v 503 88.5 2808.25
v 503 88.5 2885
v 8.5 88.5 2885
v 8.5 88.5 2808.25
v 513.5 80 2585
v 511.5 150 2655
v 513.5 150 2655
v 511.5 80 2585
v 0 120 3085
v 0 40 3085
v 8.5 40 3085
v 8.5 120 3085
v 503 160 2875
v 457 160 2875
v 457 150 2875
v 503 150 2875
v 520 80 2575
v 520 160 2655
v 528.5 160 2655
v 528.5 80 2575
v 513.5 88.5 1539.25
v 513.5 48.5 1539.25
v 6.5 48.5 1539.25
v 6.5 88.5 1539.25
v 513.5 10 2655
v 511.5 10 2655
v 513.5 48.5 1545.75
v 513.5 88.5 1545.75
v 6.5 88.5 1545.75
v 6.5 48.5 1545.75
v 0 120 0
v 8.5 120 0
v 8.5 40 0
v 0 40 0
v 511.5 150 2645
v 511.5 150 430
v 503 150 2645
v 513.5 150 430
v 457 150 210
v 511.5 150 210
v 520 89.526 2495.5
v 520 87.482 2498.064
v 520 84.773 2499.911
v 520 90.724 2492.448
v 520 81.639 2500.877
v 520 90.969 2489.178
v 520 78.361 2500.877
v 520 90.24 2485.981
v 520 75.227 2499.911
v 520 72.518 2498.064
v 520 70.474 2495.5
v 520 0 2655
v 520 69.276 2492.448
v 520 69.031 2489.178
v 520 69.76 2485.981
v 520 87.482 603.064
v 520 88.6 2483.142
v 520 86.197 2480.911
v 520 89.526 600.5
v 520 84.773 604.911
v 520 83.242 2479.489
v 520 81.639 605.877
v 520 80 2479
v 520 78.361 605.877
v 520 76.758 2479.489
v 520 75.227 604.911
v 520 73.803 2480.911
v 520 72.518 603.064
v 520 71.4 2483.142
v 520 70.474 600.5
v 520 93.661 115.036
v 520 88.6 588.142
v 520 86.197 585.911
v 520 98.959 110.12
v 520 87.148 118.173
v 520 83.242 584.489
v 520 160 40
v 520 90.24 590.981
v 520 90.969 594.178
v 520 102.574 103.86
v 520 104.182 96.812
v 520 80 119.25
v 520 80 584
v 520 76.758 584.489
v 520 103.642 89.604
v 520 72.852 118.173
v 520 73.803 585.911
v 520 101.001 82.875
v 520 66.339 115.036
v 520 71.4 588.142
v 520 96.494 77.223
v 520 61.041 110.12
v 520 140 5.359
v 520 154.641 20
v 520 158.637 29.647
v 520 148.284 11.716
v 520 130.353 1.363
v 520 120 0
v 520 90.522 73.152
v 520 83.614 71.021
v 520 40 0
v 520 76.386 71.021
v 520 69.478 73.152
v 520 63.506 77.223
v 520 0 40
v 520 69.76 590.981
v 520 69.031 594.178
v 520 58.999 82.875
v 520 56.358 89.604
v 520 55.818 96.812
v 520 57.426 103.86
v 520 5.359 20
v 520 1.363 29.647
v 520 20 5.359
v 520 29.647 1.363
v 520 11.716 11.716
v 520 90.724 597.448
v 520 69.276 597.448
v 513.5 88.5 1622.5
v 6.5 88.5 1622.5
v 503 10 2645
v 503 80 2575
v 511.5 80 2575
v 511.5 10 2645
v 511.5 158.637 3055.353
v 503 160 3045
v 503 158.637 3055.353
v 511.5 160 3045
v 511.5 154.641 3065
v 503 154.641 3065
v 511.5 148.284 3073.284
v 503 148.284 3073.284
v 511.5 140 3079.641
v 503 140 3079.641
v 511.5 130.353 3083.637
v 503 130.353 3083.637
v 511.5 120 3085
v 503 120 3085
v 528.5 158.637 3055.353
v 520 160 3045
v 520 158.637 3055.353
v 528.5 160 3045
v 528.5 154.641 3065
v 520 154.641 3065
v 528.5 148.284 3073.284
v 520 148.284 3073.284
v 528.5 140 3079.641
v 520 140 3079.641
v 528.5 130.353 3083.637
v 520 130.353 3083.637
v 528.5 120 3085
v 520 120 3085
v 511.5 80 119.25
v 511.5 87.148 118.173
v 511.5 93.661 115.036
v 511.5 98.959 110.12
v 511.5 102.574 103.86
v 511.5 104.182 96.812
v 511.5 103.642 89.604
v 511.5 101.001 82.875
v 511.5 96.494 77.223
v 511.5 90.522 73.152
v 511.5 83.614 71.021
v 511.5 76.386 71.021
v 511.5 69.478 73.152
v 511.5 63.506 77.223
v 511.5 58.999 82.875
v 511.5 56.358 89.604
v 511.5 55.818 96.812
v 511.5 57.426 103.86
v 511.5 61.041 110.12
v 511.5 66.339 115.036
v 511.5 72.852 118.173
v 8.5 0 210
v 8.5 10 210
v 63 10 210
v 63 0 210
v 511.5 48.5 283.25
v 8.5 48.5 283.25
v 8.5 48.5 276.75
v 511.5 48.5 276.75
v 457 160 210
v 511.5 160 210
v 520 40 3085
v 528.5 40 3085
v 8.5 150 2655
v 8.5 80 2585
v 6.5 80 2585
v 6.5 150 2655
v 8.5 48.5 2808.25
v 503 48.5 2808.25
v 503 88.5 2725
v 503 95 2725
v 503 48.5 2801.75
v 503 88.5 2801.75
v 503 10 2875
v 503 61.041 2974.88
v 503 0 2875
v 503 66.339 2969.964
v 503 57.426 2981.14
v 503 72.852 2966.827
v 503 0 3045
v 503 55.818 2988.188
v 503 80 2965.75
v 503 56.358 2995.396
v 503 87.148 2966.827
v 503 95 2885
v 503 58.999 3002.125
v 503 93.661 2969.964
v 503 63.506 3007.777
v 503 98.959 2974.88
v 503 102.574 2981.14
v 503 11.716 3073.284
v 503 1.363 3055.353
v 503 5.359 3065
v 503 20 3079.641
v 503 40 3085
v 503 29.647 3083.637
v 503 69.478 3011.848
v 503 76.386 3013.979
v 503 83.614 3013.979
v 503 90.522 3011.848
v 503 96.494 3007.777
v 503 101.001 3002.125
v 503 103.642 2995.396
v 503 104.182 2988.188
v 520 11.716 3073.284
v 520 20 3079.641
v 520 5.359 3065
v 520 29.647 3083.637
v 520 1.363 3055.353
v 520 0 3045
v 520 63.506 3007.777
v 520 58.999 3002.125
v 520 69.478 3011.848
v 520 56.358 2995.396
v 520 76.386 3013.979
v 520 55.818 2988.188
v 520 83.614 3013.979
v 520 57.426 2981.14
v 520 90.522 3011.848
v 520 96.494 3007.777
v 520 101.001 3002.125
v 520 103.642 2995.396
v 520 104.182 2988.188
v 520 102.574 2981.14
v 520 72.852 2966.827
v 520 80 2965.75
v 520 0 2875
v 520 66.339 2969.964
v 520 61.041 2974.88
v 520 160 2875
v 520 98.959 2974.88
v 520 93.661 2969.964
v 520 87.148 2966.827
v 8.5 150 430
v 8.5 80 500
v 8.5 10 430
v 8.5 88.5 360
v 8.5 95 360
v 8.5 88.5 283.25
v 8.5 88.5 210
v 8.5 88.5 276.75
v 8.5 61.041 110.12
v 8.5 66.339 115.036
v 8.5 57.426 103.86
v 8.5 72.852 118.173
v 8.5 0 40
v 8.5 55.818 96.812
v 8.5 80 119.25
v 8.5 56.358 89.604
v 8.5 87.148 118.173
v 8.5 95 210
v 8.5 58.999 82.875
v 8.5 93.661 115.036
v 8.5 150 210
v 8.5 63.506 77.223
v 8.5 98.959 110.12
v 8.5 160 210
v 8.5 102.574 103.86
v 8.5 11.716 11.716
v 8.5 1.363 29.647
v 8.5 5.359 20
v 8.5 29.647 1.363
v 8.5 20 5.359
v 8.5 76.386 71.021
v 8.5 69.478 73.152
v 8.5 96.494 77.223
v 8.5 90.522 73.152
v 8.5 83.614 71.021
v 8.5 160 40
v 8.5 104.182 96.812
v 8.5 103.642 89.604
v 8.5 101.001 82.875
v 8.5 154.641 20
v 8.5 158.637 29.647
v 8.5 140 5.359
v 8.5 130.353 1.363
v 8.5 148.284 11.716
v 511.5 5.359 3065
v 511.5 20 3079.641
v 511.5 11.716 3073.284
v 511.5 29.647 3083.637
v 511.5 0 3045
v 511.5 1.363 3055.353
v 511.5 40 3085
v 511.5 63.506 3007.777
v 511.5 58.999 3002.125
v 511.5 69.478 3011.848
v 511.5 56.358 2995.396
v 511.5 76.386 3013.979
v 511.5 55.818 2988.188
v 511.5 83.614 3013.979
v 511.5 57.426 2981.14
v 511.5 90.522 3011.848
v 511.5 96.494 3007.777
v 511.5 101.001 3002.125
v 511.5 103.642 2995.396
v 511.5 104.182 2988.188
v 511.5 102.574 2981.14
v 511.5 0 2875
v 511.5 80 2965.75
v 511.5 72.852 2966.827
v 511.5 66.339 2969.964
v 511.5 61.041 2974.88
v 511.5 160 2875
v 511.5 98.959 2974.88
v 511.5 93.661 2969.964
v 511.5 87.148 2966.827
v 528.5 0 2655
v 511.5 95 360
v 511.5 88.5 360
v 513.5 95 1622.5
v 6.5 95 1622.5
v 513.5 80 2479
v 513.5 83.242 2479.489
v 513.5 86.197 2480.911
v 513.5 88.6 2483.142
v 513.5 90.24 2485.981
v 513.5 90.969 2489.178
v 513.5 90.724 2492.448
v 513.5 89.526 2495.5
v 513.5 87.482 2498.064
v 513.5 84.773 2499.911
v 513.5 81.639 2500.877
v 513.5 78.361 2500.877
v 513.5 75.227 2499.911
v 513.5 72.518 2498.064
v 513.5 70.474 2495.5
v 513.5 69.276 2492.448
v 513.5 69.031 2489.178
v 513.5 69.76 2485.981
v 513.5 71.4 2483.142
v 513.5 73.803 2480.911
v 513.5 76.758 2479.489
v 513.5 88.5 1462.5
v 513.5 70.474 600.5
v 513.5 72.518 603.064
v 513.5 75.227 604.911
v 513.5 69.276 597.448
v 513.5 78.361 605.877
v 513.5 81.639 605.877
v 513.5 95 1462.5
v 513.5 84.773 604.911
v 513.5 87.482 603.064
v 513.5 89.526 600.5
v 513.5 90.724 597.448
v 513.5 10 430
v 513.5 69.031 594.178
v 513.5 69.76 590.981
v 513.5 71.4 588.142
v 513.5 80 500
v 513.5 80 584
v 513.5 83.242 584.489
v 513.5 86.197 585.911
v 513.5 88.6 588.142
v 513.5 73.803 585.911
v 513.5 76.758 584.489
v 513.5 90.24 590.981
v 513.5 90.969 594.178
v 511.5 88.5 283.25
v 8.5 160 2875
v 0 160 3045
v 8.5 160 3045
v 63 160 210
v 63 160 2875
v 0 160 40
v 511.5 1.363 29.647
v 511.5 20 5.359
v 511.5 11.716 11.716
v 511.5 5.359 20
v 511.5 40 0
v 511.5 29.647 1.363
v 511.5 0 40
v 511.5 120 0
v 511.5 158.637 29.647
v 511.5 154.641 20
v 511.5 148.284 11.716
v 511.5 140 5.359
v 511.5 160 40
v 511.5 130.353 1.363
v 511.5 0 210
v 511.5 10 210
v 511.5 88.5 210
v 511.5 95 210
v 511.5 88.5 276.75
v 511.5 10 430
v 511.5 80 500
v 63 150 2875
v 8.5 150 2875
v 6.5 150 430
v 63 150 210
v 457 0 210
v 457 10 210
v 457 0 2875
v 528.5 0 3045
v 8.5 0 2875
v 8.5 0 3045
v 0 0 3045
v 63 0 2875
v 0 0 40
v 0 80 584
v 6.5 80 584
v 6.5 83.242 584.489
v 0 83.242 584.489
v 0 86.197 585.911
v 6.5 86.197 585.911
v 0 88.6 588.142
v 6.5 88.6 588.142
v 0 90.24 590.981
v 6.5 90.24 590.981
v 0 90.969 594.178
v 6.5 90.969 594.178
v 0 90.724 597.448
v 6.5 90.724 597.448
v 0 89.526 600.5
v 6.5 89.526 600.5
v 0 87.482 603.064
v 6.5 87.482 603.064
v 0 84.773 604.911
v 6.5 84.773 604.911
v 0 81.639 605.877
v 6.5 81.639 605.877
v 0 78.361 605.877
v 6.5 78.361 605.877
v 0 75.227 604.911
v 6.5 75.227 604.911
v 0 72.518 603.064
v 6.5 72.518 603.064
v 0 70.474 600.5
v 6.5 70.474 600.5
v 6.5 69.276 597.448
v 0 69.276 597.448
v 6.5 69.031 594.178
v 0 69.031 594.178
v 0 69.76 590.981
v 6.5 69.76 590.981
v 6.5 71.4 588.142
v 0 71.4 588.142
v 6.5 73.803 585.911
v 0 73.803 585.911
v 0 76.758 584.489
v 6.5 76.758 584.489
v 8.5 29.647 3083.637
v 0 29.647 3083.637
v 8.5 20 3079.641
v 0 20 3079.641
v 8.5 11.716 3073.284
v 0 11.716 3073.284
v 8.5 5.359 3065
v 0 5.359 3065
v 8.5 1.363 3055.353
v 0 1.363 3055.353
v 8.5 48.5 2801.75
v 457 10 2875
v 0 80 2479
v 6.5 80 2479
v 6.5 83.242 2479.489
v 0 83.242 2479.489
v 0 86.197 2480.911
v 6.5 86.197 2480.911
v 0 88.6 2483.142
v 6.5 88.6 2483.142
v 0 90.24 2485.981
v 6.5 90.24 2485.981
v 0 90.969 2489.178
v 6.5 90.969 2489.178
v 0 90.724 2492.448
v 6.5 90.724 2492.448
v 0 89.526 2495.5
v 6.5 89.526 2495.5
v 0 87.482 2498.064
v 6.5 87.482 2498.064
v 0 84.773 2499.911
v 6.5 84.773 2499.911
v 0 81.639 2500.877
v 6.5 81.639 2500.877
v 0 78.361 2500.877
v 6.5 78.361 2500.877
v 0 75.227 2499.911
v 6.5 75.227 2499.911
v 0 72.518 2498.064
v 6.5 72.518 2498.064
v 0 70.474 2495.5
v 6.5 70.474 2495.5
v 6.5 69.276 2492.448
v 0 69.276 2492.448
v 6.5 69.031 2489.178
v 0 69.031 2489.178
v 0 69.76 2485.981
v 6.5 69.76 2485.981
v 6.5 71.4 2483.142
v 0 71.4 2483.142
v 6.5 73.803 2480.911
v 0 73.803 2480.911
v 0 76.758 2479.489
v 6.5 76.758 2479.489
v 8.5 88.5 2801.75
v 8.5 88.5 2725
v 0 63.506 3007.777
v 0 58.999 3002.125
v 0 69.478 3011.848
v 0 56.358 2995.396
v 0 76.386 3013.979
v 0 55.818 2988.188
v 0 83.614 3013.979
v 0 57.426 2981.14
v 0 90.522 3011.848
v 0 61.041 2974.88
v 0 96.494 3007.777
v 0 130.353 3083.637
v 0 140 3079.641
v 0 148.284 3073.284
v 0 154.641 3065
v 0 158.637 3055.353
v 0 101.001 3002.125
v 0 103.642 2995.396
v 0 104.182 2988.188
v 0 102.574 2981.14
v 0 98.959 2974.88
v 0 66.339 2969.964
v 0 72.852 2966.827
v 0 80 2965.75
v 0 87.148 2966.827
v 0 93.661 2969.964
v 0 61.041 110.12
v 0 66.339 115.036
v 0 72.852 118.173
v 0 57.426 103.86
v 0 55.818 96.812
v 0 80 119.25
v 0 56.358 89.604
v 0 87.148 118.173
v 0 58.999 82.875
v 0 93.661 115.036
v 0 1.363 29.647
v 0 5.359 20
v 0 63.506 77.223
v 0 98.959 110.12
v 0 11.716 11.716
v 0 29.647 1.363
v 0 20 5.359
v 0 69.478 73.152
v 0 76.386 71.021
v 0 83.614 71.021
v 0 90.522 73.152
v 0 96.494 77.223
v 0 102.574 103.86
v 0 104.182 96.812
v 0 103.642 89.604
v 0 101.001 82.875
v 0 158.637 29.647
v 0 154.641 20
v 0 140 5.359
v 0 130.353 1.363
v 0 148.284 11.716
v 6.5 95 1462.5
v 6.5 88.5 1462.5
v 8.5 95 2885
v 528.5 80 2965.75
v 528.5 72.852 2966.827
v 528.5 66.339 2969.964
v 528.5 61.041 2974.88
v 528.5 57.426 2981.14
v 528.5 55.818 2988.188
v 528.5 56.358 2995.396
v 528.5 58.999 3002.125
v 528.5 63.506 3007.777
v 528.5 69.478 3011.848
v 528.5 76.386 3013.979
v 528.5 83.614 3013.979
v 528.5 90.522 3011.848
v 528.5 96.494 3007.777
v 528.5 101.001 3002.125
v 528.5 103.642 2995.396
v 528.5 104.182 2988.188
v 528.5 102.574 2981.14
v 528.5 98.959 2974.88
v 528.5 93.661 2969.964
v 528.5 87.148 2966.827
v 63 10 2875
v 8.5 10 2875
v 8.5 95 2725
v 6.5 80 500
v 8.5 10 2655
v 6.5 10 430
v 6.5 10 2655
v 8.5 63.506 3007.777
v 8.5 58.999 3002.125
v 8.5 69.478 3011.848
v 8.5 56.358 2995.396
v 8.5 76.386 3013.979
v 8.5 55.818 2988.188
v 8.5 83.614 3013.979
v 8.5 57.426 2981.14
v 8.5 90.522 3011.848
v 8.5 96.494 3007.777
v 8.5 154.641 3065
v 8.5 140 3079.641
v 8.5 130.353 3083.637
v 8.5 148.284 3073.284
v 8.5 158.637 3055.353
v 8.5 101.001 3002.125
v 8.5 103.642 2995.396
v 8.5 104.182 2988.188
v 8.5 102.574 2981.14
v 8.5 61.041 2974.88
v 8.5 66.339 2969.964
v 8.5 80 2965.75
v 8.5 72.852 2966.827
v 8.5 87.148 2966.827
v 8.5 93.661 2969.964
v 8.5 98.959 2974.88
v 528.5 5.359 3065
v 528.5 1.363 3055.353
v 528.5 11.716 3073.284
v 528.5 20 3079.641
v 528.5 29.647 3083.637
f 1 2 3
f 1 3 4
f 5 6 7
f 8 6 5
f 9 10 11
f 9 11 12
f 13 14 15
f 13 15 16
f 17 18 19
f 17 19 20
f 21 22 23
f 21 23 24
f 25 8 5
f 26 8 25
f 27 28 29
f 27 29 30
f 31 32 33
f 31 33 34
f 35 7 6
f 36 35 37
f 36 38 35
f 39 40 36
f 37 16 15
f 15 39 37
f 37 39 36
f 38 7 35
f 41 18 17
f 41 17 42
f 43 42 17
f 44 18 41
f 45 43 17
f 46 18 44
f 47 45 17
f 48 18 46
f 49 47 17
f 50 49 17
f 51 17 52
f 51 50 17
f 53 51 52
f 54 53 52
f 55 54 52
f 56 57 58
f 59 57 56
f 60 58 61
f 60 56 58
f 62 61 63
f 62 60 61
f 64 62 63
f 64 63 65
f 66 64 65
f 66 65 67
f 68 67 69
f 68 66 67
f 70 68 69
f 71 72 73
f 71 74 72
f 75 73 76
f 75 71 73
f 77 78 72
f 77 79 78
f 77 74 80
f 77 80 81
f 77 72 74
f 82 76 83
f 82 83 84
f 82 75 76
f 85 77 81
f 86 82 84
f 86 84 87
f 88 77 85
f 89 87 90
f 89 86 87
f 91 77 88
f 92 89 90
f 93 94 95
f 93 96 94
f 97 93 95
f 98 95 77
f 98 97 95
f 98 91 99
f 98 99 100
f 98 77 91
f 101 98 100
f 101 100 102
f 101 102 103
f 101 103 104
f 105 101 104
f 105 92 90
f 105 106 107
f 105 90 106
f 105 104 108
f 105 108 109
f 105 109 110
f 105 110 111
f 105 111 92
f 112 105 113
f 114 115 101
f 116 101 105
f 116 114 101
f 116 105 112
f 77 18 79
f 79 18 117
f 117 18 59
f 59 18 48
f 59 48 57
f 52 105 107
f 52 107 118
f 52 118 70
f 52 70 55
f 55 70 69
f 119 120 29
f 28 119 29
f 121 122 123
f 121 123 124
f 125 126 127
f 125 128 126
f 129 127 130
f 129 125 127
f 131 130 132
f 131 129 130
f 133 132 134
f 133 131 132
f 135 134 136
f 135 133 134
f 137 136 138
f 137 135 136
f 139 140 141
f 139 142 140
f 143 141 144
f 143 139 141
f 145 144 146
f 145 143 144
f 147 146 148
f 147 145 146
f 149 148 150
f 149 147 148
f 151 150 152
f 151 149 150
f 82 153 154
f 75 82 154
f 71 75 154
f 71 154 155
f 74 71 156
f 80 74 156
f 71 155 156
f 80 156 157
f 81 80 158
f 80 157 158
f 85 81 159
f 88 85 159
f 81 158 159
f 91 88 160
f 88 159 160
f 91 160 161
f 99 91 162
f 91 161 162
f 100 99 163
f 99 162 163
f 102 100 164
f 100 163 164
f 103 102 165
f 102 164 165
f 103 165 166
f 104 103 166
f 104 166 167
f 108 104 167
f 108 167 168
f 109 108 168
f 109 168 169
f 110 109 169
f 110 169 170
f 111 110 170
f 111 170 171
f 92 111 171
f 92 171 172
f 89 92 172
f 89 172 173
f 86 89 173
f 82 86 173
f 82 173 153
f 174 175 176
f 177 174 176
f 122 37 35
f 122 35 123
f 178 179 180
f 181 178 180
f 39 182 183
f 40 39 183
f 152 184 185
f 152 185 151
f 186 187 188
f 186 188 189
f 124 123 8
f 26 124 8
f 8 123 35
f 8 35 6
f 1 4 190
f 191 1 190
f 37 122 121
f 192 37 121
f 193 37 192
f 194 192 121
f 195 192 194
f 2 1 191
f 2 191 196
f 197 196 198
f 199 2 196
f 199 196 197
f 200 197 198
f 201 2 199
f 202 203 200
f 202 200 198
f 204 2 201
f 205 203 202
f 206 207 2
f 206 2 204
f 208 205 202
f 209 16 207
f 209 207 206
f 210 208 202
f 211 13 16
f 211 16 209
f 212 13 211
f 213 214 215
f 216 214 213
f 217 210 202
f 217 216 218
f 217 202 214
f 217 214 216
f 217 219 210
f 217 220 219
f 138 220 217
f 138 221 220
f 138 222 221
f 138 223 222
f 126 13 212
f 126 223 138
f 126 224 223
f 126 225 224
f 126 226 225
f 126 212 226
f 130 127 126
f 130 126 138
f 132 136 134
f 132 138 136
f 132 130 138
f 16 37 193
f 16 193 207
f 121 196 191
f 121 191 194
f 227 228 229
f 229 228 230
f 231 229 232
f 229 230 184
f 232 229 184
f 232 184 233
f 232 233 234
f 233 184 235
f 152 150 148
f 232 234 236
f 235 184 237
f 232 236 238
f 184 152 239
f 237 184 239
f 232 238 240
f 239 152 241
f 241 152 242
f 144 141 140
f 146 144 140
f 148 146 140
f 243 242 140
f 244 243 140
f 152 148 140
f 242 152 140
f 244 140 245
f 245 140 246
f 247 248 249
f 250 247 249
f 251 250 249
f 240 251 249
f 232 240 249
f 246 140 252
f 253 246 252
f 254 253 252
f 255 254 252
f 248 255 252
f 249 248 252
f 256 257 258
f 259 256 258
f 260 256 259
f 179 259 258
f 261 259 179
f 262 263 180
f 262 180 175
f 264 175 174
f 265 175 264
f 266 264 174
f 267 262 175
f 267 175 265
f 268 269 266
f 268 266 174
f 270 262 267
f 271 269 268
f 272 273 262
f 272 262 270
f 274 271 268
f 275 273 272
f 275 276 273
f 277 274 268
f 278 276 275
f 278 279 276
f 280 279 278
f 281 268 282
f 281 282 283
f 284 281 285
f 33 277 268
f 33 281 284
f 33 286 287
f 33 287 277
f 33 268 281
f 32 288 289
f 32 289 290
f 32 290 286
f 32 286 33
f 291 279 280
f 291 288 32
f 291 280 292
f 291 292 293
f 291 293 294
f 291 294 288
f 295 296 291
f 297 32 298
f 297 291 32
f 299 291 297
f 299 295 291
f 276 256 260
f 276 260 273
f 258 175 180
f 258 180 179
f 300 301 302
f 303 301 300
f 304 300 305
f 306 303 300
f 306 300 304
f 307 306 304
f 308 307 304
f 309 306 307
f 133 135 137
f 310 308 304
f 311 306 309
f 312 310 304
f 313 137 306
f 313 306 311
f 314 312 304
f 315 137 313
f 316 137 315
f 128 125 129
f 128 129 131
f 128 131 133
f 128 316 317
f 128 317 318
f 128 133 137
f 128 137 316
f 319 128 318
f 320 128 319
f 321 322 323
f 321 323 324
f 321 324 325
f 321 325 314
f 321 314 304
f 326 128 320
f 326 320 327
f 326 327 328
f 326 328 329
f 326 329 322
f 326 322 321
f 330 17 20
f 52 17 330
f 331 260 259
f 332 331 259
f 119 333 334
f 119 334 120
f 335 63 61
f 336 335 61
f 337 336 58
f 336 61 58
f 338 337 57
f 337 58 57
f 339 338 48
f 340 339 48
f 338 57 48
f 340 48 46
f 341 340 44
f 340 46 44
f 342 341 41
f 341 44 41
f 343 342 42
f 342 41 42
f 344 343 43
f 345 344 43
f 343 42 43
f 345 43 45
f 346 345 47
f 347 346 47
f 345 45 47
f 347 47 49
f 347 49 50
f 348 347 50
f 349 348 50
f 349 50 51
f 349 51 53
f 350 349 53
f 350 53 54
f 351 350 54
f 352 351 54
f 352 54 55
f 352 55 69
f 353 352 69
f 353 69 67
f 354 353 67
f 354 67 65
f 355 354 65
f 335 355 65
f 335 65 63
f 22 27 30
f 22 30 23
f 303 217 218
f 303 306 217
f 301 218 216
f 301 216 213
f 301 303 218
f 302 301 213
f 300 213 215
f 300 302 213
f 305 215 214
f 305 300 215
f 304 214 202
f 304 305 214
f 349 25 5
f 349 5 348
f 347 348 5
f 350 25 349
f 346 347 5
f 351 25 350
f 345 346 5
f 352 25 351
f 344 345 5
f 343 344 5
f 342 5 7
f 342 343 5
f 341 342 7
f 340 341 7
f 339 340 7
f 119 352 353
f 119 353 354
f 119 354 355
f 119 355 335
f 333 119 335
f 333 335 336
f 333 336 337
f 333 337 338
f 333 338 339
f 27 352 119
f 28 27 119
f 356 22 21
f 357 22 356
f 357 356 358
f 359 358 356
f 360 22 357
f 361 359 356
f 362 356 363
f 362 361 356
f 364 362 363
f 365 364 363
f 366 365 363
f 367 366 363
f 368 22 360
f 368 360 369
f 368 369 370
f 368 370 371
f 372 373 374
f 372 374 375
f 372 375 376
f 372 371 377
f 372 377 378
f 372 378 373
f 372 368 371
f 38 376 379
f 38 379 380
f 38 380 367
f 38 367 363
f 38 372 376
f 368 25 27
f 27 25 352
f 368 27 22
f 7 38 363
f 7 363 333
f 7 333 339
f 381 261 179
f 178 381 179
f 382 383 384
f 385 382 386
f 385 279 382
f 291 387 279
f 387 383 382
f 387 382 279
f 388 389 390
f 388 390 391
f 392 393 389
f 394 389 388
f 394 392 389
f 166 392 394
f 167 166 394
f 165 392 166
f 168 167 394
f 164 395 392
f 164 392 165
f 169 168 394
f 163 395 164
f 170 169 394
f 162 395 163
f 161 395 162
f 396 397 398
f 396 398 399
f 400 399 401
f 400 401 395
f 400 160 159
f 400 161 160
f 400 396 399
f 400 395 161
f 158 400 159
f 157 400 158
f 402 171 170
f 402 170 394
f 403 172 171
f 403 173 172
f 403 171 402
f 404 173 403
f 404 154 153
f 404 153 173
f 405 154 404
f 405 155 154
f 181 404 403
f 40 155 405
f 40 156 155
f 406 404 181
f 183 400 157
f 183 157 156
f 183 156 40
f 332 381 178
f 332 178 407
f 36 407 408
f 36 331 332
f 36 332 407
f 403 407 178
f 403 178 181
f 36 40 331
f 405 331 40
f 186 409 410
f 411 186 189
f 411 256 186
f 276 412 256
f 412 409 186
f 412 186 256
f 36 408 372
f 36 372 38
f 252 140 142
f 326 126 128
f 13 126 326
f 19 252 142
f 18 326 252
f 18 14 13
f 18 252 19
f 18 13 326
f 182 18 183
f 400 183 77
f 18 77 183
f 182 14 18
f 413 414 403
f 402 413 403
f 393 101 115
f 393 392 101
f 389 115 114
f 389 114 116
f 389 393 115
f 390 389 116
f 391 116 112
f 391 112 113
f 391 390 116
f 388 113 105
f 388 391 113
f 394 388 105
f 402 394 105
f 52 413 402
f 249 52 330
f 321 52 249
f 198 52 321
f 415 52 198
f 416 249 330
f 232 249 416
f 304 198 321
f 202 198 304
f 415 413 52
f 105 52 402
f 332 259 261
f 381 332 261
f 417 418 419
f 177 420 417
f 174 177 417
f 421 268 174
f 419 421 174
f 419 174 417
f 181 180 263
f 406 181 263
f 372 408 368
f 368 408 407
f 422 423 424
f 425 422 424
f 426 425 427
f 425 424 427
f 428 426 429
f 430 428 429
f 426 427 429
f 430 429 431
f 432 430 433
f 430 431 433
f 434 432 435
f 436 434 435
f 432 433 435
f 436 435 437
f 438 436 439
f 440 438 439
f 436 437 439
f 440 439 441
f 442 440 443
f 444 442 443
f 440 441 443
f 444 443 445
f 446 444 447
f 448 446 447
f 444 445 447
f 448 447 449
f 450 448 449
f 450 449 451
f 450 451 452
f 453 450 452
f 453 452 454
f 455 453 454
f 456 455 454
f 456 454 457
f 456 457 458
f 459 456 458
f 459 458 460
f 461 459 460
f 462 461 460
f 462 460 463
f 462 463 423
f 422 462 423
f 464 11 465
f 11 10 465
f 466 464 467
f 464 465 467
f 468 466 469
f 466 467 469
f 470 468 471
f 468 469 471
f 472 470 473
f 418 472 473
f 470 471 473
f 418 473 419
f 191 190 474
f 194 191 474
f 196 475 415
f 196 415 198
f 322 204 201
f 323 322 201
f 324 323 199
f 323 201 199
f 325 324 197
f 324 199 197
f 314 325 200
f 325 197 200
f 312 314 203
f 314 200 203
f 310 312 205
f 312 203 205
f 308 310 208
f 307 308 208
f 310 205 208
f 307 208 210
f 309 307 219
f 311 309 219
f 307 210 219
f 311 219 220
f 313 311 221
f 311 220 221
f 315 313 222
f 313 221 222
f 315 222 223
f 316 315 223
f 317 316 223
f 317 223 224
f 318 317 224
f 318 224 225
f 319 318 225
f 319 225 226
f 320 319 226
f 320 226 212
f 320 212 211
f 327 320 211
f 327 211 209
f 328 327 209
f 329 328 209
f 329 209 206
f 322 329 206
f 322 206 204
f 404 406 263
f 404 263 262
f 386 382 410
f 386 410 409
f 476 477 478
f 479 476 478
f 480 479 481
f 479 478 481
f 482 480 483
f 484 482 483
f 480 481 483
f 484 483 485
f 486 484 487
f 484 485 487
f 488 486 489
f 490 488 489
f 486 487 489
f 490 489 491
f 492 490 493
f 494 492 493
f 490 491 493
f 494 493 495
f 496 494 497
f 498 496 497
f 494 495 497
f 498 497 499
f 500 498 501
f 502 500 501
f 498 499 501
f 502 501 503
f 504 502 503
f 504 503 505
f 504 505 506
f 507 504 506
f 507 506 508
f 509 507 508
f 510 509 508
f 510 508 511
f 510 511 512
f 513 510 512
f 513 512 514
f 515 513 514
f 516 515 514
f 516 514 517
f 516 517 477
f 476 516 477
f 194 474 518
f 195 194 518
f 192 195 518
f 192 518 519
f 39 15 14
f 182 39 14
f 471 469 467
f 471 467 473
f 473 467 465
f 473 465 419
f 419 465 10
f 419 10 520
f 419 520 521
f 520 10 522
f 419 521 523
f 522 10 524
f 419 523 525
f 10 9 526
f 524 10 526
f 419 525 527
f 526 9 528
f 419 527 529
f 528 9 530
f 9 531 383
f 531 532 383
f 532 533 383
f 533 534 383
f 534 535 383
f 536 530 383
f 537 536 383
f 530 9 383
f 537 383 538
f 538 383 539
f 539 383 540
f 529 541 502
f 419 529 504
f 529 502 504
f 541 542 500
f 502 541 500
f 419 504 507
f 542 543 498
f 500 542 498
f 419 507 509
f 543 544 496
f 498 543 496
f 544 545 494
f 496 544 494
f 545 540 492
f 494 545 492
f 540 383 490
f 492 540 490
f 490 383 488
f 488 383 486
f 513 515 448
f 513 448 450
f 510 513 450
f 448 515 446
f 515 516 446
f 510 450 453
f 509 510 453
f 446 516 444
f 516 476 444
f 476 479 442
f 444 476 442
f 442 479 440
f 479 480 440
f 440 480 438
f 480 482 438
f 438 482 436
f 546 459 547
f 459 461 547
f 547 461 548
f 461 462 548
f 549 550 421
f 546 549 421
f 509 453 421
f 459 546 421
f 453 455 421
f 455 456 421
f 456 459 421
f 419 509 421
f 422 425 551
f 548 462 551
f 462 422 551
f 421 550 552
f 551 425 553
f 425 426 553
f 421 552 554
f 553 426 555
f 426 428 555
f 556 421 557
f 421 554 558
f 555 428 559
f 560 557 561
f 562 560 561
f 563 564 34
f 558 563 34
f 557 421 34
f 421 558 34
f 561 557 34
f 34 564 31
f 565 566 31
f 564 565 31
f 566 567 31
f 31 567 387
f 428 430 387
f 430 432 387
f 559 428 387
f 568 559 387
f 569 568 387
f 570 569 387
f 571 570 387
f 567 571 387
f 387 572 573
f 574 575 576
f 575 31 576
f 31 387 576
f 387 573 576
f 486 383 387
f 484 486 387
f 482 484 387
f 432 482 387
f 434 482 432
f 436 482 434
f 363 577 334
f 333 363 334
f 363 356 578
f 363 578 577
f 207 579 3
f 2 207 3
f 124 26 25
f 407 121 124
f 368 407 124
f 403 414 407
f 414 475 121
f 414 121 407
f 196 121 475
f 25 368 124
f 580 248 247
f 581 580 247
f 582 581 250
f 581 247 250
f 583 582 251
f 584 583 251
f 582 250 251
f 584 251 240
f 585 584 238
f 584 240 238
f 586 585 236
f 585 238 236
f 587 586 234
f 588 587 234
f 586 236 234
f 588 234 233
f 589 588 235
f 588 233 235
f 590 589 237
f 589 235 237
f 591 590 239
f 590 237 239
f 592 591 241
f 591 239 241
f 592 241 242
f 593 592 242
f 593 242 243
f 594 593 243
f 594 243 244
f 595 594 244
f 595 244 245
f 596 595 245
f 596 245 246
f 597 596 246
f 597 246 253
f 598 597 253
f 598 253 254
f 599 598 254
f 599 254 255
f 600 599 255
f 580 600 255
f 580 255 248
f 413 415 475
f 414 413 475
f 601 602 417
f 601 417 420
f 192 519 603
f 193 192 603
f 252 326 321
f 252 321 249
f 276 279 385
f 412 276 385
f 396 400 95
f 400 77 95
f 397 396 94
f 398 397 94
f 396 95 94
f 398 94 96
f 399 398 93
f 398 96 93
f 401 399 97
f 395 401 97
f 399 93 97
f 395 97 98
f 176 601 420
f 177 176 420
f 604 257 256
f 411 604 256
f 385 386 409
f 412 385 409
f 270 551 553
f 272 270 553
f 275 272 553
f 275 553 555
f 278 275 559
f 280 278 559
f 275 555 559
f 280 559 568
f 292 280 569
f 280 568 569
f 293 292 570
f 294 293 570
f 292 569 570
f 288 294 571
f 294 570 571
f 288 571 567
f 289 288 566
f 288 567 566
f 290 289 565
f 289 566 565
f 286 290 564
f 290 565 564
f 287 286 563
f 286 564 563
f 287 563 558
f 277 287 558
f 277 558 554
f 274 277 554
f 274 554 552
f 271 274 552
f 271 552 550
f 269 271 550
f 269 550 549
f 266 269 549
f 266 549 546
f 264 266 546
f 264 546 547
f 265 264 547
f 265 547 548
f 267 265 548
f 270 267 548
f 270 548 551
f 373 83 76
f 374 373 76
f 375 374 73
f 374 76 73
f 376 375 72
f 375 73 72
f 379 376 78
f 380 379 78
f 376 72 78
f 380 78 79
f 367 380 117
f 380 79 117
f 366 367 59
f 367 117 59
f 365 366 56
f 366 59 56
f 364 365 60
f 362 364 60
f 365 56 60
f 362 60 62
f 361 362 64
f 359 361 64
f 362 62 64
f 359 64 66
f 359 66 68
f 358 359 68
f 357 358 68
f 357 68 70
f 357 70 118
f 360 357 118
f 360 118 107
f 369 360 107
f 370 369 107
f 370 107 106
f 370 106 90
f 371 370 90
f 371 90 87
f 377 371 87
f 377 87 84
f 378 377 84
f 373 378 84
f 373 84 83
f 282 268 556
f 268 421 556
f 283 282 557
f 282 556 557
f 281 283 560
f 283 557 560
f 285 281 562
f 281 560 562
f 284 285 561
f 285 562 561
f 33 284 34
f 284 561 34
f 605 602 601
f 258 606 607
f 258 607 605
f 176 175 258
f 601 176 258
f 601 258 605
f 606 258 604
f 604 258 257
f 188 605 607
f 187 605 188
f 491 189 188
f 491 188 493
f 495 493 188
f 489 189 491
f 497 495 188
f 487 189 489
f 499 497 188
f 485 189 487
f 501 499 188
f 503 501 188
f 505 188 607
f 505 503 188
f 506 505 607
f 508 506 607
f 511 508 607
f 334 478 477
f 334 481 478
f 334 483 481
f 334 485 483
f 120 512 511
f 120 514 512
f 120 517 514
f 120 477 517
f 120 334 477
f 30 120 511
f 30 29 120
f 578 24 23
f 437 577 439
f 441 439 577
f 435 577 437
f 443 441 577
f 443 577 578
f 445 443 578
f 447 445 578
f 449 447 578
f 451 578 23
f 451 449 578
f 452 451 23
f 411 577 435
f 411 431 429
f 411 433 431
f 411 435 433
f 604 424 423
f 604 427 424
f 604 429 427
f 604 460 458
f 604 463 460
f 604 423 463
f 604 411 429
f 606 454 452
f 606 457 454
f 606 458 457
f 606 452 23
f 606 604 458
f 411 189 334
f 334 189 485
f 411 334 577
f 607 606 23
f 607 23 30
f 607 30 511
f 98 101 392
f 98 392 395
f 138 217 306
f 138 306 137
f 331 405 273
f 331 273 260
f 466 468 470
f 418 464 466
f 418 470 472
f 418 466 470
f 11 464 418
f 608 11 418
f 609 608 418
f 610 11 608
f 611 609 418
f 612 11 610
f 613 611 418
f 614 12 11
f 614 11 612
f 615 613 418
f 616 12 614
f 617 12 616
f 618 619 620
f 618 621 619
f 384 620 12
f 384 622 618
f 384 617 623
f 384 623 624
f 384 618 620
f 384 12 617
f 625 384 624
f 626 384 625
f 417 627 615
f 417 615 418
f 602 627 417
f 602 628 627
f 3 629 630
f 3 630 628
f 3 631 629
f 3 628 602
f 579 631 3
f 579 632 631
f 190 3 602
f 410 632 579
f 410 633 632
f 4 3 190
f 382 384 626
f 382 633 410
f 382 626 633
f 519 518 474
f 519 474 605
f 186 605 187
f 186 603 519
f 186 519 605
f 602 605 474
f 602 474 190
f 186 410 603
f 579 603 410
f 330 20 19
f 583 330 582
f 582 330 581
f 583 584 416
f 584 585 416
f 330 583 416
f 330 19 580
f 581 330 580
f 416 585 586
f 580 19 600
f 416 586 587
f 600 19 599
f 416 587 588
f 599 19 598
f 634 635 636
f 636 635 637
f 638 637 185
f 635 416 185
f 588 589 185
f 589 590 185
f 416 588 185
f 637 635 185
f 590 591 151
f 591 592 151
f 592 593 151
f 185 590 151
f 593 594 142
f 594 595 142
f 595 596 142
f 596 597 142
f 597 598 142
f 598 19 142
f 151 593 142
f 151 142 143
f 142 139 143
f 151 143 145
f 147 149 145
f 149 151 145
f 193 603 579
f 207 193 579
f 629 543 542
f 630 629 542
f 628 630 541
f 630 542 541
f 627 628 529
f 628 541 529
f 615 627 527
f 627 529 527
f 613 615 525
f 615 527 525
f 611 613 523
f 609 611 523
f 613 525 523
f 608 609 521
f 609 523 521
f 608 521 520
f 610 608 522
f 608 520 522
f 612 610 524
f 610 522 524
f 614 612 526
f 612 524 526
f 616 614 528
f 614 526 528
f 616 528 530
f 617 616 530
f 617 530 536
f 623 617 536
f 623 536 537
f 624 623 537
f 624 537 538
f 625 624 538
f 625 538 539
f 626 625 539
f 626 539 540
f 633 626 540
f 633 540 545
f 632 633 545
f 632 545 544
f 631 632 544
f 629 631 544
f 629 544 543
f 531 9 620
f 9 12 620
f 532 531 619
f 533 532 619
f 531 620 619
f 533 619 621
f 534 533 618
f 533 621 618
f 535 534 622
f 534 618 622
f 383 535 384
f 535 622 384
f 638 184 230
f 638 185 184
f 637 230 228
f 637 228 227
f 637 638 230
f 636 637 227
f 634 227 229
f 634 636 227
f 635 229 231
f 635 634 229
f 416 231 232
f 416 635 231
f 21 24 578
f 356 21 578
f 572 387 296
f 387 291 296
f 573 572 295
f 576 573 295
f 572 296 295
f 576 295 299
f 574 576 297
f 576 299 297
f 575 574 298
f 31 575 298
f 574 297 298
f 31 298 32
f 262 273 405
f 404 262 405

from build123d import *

# Parameters (mm, degrees)
EXTRUDE_1_DEPTH        = 3085
EXTRUDE_1_2_DEPTH      = 3085
EXTRUDE_3_DEPTH        = 520
SKETCH_6_W             = 503
SKETCH_6_H             = 210
CUT_EXTRUDE_4_DEPTH    = 3133.606741996
PATTERN_LINEAR_1_COUNT = 3
PATTERN_LINEAR_1_PITCH = 1262.5
SKETCH_7_W             = 500
SKETCH_7_H             = 140
EXTRUDE_5_DEPTH        = 2
CUT_EXTRUDE_6_DEPTH    = 2
CUT_EXTRUDE_7_DEPTH    = 2
SKETCH_15_W            = 500
SKETCH_15_H            = 140
EXTRUDE_8_DEPTH        = 2
CUT_EXTRUDE_9_DEPTH    = 2
CUT_EXTRUDE_10_DEPTH   = 2
EXTRUDE_11_DEPTH       = 8.5
PATTERN_LINEAR_2_COUNT = 2
PATTERN_LINEAR_2_PITCH = 17
SKETCH_22_W            = 8.5
SKETCH_22_H            = 210
CUT_EXTRUDE_12_DEPTH   = 3135.028916586
FILLET_1_R             = 40
SKETCH_23_R            = 24.25
CUT_EXTRUDE_13_DEPTH   = 3135.028916586
SKETCH_24_R            = 11
CUT_EXTRUDE_14_DEPTH   = 3133.606741996


with BuildPart() as part:
    # 草图2 → 拉伸1 (new body)
    with BuildSketch(Plane.XY):
        Polygon((0, 0), (0, 160), (63, 160), (63, 150), (6.5, 150), (6.5, 10), (63, 10), (63, 0), align=None)
    extrude(amount=EXTRUDE_1_DEPTH)



with BuildPart() as body_2:
    # 草图2 → Extrude 1 2 (new body)
    with BuildSketch(Plane.XY):
        Polygon((457, 160), (520, 160), (520, 0), (457, 0), (457, 10), (513.5, 10), (513.5, 150), (457, 150), align=None)
    extrude(amount=EXTRUDE_1_2_DEPTH)


with BuildPart() as part_1:
    add(part.part)

    add(body_2.part)  # 拉伸3 merges body 2
    # 草图5 → 拉伸3 (add)
    with BuildSketch(Plane.ZY):
        Polygon((200, 95), (360, 95), (360, 88.5), (283.25, 88.5), (283.25, 48.5), (276.75, 48.5), (276.75, 88.5), (200, 88.5), align=None)
    extrude_3 = extrude(amount=-EXTRUDE_3_DEPTH)

    # 草图6 → 拉伸4 (cut, through all)
    with BuildSketch(Plane(origin=(0, 160, 0), x_dir=(1, 0, 0), z_dir=(0, 1, 0))):
        with Locations((260, -105)):
            Rectangle(SKETCH_6_W, SKETCH_6_H)
        with Locations((260, -2980)):
            Rectangle(SKETCH_6_W, SKETCH_6_H)
    extrude(amount=-CUT_EXTRUDE_4_DEPTH, mode=Mode.SUBTRACT)

    # 阵列(线性)1: 拉伸3 ×3
    with Locations(*[(0, 0, i * PATTERN_LINEAR_1_PITCH) for i in range(1, PATTERN_LINEAR_1_COUNT)]):
        add(extrude_3)

    # 草图7 → 拉伸5 (add)
    with BuildSketch(Plane.ZY.offset(-513.5)):
        with Locations((250, 80)):
            Rectangle(SKETCH_7_W, SKETCH_7_H)
        with Locations((2835, 80)):
            Rectangle(SKETCH_7_W, SKETCH_7_H)
    extrude(amount=EXTRUDE_5_DEPTH)

    # 草图13 → 拉伸6 (cut)
    with BuildSketch(Plane.ZY.offset(-511.5)):
        Polygon((500, 10), (500, 80), (430, 10), align=None)
        Polygon((2585, 150), (2655, 150), (2585, 80), align=None)
    extrude(amount=-CUT_EXTRUDE_6_DEPTH, mode=Mode.SUBTRACT)

    # 草图14 → 拉伸7 (cut)
    with BuildSketch(Plane.ZY.offset(-511.5)):
        Polygon((500, 80), (430, 150), (500, 150), align=None)
        Polygon((2585, 80), (2655, 10), (2585, 10), align=None)
    extrude(amount=-CUT_EXTRUDE_7_DEPTH, mode=Mode.SUBTRACT)

    # 草图15 → 拉伸8 (add)
    with BuildSketch(Plane(origin=(6.5, 0, 0), x_dir=(0, 0, -1), z_dir=(1, 0, 0))):
        with Locations((-2835, 80)):
            Rectangle(SKETCH_15_W, SKETCH_15_H)
        with Locations((-250, 80)):
            Rectangle(SKETCH_15_W, SKETCH_15_H)
    extrude(amount=EXTRUDE_8_DEPTH)

    # 草图16 → 拉伸9 (cut)
    with BuildSketch(Plane(origin=(8.5, 0, 0), x_dir=(0, 0, -1), z_dir=(1, 0, 0))):
        Polygon((-2585, 150), (-2585, 80), (-2655, 150), align=None)
        Polygon((-500, 150), (-500, 80), (-430, 150), align=None)
    extrude(amount=-CUT_EXTRUDE_9_DEPTH, mode=Mode.SUBTRACT)

    # 草图18 → 拉伸10 (cut)
    with BuildSketch(Plane(origin=(8.5, 0, 0), x_dir=(0, 0, -1), z_dir=(1, 0, 0))):
        Polygon((-500, 80), (-500, 10), (-430, 10), align=None)
        Polygon((-2585, 10), (-2655, 10), (-2585, 80), align=None)
    extrude(amount=-CUT_EXTRUDE_10_DEPTH, mode=Mode.SUBTRACT)

    # 草图19 → 拉伸11 (add)
    with BuildSketch(Plane(origin=(520, 0, 0), x_dir=(0, 0, -1), z_dir=(1, 0, 0))):
        Polygon((-3085, 160), (-2655, 160), (-2575, 80), (-2655, 0), (-3085, 0), align=None)
    extrude_11 = extrude(amount=EXTRUDE_11_DEPTH)

    # 阵列(线性)2: 拉伸11 ×2
    with Locations(*[(-i * PATTERN_LINEAR_2_PITCH, 0, 0) for i in range(1, PATTERN_LINEAR_2_COUNT)]):
        add(extrude_11)

    # 草图22 → 拉伸12 (cut, through all)
    with BuildSketch(Plane(origin=(0, 160, 0), x_dir=(1, 0, 0), z_dir=(0, 1, 0))):
        with Locations((515.75, -2980)):
            Rectangle(SKETCH_22_W, SKETCH_22_H)
    extrude(amount=-CUT_EXTRUDE_12_DEPTH, mode=Mode.SUBTRACT)

    # 圆角1
    fillet_1_edges = [part_1.edges().sort_by_distance(p)[0] for p in [
        (4.25, 0, 0),
        (507.25, 0, 3085),
        (4.25, 160, 3085),
        (4.25, 0, 3085),
        (507.25, 160, 3085),
        (524.25, 0, 3085),
        (515.75, 160, 0),
        (524.25, 160, 3085),
        (515.75, 0, 0),
        (4.25, 160, 0),
    ]]
    fillet(fillet_1_edges, radius=FILLET_1_R)

    # 草图23 → 拉伸13 (cut, through all)
    with BuildSketch(Plane.ZY):
        with Locations((95, 80)):
            Circle(SKETCH_23_R)
        with Locations(Location((2990, 80, 0), (0, 0, 180))):
            Circle(SKETCH_23_R)
    extrude(amount=-CUT_EXTRUDE_13_DEPTH, mode=Mode.SUBTRACT)

    # 草图24 → 拉伸14 (cut, through all)
    with BuildSketch(Plane(origin=(520, 0, 0), x_dir=(0, 0, -1), z_dir=(1, 0, 0))):
        with Locations((-2490, 80)):
            Circle(SKETCH_24_R)
        with Locations((-595, 80)):
            Circle(SKETCH_24_R)
    extrude(amount=-CUT_EXTRUDE_14_DEPTH, mode=Mode.SUBTRACT)


solid = part_1.part
